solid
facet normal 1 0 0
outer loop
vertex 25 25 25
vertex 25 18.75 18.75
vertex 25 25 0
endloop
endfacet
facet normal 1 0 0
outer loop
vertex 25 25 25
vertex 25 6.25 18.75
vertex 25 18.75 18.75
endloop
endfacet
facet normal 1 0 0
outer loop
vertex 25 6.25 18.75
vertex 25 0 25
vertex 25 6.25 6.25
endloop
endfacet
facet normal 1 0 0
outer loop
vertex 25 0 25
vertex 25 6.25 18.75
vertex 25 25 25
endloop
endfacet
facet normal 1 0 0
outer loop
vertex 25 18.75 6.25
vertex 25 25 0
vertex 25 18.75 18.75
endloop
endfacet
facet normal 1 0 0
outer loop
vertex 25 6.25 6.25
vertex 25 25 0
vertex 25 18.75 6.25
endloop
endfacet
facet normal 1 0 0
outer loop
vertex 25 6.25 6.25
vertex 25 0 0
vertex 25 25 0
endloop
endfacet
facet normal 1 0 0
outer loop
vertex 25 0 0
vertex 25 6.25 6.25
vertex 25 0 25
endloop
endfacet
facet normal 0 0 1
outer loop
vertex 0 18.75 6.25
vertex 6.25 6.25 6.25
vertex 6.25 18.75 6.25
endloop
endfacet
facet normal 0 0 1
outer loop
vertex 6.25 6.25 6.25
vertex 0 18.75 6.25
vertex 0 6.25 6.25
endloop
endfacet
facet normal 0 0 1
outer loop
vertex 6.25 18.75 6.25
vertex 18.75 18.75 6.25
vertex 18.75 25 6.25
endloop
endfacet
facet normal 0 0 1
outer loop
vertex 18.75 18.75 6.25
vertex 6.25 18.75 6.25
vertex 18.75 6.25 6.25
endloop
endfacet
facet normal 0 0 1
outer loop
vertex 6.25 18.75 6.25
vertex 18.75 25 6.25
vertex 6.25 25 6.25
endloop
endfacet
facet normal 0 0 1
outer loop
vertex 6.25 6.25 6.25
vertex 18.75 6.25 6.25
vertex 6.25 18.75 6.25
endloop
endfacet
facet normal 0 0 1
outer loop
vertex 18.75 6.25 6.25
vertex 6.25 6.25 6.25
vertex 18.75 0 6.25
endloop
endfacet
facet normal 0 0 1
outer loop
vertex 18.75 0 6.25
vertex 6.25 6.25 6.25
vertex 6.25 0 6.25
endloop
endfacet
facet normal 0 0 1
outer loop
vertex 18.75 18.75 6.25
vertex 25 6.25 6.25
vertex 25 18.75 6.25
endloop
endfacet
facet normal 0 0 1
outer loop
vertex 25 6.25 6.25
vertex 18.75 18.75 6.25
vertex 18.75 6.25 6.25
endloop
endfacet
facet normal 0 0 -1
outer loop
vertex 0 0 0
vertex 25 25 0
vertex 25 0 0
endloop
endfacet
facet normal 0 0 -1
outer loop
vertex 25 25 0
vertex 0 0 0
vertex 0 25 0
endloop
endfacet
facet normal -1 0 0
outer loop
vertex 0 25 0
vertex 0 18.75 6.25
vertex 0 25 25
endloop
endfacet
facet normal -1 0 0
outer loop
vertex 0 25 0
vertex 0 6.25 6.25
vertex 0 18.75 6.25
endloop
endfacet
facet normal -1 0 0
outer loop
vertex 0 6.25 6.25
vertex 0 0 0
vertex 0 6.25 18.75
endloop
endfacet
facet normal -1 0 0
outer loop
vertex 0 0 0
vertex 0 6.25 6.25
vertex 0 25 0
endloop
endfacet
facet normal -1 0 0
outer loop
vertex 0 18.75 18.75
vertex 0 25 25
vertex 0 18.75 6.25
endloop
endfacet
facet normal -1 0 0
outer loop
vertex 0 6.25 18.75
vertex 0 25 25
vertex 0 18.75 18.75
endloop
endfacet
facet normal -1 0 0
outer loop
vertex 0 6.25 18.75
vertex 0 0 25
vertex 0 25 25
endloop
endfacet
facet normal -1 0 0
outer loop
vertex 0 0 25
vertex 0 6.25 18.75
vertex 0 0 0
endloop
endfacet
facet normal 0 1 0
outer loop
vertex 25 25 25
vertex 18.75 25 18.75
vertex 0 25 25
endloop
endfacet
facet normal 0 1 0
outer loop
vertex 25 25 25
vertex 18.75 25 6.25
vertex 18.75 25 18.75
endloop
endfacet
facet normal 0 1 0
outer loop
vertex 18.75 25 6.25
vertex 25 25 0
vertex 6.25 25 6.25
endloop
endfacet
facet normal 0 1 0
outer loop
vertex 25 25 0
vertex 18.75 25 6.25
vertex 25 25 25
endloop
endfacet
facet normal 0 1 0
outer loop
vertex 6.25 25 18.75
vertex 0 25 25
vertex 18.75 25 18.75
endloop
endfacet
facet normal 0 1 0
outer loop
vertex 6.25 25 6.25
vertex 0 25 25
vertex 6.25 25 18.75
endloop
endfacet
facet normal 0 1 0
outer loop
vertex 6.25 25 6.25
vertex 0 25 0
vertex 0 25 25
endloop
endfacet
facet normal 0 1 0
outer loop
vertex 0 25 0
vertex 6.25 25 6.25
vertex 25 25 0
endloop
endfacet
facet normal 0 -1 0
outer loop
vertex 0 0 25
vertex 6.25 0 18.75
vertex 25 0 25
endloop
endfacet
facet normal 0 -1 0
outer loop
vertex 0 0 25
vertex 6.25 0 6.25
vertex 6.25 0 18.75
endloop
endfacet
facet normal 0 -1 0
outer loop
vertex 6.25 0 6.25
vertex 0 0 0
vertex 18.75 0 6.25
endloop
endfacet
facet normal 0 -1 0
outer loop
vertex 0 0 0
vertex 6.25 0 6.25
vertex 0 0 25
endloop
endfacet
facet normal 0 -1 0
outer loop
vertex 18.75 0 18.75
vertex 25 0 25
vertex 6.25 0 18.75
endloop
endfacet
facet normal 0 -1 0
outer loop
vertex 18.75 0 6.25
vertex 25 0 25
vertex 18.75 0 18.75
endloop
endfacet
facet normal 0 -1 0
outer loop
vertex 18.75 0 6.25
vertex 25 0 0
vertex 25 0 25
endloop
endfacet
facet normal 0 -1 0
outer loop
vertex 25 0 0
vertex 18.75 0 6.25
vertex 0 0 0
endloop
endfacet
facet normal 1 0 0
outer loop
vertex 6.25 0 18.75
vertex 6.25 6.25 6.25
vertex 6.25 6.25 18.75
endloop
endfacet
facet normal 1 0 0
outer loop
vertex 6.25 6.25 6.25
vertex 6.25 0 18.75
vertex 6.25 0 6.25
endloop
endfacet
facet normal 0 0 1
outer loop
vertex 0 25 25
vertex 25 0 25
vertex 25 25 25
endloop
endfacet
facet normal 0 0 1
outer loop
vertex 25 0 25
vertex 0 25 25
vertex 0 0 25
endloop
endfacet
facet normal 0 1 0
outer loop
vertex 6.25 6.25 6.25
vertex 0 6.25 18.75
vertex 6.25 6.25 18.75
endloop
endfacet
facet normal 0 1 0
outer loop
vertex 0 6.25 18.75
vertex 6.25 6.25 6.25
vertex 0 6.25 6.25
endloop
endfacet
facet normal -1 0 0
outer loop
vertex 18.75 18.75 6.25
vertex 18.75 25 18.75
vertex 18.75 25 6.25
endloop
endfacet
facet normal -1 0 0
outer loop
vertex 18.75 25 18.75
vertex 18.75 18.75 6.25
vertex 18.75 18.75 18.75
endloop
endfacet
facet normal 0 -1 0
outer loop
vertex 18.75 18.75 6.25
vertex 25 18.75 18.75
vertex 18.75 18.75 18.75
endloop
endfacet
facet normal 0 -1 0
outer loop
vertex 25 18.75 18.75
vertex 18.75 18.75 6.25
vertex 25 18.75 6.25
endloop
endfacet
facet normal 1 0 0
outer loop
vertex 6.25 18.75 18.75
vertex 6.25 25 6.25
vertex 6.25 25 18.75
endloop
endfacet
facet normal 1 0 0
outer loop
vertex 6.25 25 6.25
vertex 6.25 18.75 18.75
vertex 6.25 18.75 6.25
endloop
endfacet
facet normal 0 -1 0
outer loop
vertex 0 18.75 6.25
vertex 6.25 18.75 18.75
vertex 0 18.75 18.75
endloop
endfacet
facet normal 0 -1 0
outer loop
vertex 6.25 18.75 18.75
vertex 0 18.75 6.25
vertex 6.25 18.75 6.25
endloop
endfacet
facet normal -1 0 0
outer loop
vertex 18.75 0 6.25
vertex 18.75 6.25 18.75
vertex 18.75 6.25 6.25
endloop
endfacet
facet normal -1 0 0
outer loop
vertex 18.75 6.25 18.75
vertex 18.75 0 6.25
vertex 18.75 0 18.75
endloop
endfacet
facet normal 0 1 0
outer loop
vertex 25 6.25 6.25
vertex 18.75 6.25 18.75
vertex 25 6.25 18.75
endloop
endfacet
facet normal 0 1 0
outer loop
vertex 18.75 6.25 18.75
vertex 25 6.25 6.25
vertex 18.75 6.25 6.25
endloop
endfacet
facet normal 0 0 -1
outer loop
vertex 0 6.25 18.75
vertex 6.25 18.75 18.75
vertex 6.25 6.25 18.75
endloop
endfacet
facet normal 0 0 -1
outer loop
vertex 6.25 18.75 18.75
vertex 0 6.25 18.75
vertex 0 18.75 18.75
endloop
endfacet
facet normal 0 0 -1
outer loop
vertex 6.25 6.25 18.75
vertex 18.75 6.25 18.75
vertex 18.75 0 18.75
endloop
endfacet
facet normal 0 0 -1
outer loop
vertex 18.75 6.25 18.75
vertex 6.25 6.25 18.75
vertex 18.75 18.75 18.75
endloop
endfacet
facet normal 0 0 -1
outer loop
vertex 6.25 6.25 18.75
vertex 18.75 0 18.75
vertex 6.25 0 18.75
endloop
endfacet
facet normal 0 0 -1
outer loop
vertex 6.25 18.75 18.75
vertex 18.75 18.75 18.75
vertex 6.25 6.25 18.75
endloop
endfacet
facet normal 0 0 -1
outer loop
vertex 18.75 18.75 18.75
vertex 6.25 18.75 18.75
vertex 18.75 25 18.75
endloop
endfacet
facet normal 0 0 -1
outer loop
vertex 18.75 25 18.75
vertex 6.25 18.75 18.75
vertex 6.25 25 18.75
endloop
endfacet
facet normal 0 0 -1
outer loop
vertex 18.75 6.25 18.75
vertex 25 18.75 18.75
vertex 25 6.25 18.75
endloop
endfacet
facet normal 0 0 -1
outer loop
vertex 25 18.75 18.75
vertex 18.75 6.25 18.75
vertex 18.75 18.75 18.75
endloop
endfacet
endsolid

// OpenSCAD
edge = 25;
pillars= edge/4;

translate( v = [0,
                0,
                0] ) {
    cube(
        [edge,
        edge,
        pillars,
        ],
        center=false);
}

translate( v = [0,
                0,
                0] ) {
    cube(
        [pillars,
        pillars,
        edge,
        ],
        center=false);
}

    
translate( v = [edge - pillars,
                edge - pillars,
                0] ) {
    cube(
        [pillars,
        pillars,
        edge,
        ],
        center=false);
}

translate( v = [0,
                edge - pillars,
                0] ) {
    cube(
        [pillars,
        pillars,
        edge,
        ],
        center=false);
}

translate( v = [edge - pillars,
                0,
                0] ) {
    cube(
        [pillars,
        pillars,
        edge,
        ],
        center=false);
}

// Top
translate( v = [0,
                0, 
                edge - pillars] ) {
    cube(
        [edge,
        edge,
        pillars,
        ],
        center=false);
}
